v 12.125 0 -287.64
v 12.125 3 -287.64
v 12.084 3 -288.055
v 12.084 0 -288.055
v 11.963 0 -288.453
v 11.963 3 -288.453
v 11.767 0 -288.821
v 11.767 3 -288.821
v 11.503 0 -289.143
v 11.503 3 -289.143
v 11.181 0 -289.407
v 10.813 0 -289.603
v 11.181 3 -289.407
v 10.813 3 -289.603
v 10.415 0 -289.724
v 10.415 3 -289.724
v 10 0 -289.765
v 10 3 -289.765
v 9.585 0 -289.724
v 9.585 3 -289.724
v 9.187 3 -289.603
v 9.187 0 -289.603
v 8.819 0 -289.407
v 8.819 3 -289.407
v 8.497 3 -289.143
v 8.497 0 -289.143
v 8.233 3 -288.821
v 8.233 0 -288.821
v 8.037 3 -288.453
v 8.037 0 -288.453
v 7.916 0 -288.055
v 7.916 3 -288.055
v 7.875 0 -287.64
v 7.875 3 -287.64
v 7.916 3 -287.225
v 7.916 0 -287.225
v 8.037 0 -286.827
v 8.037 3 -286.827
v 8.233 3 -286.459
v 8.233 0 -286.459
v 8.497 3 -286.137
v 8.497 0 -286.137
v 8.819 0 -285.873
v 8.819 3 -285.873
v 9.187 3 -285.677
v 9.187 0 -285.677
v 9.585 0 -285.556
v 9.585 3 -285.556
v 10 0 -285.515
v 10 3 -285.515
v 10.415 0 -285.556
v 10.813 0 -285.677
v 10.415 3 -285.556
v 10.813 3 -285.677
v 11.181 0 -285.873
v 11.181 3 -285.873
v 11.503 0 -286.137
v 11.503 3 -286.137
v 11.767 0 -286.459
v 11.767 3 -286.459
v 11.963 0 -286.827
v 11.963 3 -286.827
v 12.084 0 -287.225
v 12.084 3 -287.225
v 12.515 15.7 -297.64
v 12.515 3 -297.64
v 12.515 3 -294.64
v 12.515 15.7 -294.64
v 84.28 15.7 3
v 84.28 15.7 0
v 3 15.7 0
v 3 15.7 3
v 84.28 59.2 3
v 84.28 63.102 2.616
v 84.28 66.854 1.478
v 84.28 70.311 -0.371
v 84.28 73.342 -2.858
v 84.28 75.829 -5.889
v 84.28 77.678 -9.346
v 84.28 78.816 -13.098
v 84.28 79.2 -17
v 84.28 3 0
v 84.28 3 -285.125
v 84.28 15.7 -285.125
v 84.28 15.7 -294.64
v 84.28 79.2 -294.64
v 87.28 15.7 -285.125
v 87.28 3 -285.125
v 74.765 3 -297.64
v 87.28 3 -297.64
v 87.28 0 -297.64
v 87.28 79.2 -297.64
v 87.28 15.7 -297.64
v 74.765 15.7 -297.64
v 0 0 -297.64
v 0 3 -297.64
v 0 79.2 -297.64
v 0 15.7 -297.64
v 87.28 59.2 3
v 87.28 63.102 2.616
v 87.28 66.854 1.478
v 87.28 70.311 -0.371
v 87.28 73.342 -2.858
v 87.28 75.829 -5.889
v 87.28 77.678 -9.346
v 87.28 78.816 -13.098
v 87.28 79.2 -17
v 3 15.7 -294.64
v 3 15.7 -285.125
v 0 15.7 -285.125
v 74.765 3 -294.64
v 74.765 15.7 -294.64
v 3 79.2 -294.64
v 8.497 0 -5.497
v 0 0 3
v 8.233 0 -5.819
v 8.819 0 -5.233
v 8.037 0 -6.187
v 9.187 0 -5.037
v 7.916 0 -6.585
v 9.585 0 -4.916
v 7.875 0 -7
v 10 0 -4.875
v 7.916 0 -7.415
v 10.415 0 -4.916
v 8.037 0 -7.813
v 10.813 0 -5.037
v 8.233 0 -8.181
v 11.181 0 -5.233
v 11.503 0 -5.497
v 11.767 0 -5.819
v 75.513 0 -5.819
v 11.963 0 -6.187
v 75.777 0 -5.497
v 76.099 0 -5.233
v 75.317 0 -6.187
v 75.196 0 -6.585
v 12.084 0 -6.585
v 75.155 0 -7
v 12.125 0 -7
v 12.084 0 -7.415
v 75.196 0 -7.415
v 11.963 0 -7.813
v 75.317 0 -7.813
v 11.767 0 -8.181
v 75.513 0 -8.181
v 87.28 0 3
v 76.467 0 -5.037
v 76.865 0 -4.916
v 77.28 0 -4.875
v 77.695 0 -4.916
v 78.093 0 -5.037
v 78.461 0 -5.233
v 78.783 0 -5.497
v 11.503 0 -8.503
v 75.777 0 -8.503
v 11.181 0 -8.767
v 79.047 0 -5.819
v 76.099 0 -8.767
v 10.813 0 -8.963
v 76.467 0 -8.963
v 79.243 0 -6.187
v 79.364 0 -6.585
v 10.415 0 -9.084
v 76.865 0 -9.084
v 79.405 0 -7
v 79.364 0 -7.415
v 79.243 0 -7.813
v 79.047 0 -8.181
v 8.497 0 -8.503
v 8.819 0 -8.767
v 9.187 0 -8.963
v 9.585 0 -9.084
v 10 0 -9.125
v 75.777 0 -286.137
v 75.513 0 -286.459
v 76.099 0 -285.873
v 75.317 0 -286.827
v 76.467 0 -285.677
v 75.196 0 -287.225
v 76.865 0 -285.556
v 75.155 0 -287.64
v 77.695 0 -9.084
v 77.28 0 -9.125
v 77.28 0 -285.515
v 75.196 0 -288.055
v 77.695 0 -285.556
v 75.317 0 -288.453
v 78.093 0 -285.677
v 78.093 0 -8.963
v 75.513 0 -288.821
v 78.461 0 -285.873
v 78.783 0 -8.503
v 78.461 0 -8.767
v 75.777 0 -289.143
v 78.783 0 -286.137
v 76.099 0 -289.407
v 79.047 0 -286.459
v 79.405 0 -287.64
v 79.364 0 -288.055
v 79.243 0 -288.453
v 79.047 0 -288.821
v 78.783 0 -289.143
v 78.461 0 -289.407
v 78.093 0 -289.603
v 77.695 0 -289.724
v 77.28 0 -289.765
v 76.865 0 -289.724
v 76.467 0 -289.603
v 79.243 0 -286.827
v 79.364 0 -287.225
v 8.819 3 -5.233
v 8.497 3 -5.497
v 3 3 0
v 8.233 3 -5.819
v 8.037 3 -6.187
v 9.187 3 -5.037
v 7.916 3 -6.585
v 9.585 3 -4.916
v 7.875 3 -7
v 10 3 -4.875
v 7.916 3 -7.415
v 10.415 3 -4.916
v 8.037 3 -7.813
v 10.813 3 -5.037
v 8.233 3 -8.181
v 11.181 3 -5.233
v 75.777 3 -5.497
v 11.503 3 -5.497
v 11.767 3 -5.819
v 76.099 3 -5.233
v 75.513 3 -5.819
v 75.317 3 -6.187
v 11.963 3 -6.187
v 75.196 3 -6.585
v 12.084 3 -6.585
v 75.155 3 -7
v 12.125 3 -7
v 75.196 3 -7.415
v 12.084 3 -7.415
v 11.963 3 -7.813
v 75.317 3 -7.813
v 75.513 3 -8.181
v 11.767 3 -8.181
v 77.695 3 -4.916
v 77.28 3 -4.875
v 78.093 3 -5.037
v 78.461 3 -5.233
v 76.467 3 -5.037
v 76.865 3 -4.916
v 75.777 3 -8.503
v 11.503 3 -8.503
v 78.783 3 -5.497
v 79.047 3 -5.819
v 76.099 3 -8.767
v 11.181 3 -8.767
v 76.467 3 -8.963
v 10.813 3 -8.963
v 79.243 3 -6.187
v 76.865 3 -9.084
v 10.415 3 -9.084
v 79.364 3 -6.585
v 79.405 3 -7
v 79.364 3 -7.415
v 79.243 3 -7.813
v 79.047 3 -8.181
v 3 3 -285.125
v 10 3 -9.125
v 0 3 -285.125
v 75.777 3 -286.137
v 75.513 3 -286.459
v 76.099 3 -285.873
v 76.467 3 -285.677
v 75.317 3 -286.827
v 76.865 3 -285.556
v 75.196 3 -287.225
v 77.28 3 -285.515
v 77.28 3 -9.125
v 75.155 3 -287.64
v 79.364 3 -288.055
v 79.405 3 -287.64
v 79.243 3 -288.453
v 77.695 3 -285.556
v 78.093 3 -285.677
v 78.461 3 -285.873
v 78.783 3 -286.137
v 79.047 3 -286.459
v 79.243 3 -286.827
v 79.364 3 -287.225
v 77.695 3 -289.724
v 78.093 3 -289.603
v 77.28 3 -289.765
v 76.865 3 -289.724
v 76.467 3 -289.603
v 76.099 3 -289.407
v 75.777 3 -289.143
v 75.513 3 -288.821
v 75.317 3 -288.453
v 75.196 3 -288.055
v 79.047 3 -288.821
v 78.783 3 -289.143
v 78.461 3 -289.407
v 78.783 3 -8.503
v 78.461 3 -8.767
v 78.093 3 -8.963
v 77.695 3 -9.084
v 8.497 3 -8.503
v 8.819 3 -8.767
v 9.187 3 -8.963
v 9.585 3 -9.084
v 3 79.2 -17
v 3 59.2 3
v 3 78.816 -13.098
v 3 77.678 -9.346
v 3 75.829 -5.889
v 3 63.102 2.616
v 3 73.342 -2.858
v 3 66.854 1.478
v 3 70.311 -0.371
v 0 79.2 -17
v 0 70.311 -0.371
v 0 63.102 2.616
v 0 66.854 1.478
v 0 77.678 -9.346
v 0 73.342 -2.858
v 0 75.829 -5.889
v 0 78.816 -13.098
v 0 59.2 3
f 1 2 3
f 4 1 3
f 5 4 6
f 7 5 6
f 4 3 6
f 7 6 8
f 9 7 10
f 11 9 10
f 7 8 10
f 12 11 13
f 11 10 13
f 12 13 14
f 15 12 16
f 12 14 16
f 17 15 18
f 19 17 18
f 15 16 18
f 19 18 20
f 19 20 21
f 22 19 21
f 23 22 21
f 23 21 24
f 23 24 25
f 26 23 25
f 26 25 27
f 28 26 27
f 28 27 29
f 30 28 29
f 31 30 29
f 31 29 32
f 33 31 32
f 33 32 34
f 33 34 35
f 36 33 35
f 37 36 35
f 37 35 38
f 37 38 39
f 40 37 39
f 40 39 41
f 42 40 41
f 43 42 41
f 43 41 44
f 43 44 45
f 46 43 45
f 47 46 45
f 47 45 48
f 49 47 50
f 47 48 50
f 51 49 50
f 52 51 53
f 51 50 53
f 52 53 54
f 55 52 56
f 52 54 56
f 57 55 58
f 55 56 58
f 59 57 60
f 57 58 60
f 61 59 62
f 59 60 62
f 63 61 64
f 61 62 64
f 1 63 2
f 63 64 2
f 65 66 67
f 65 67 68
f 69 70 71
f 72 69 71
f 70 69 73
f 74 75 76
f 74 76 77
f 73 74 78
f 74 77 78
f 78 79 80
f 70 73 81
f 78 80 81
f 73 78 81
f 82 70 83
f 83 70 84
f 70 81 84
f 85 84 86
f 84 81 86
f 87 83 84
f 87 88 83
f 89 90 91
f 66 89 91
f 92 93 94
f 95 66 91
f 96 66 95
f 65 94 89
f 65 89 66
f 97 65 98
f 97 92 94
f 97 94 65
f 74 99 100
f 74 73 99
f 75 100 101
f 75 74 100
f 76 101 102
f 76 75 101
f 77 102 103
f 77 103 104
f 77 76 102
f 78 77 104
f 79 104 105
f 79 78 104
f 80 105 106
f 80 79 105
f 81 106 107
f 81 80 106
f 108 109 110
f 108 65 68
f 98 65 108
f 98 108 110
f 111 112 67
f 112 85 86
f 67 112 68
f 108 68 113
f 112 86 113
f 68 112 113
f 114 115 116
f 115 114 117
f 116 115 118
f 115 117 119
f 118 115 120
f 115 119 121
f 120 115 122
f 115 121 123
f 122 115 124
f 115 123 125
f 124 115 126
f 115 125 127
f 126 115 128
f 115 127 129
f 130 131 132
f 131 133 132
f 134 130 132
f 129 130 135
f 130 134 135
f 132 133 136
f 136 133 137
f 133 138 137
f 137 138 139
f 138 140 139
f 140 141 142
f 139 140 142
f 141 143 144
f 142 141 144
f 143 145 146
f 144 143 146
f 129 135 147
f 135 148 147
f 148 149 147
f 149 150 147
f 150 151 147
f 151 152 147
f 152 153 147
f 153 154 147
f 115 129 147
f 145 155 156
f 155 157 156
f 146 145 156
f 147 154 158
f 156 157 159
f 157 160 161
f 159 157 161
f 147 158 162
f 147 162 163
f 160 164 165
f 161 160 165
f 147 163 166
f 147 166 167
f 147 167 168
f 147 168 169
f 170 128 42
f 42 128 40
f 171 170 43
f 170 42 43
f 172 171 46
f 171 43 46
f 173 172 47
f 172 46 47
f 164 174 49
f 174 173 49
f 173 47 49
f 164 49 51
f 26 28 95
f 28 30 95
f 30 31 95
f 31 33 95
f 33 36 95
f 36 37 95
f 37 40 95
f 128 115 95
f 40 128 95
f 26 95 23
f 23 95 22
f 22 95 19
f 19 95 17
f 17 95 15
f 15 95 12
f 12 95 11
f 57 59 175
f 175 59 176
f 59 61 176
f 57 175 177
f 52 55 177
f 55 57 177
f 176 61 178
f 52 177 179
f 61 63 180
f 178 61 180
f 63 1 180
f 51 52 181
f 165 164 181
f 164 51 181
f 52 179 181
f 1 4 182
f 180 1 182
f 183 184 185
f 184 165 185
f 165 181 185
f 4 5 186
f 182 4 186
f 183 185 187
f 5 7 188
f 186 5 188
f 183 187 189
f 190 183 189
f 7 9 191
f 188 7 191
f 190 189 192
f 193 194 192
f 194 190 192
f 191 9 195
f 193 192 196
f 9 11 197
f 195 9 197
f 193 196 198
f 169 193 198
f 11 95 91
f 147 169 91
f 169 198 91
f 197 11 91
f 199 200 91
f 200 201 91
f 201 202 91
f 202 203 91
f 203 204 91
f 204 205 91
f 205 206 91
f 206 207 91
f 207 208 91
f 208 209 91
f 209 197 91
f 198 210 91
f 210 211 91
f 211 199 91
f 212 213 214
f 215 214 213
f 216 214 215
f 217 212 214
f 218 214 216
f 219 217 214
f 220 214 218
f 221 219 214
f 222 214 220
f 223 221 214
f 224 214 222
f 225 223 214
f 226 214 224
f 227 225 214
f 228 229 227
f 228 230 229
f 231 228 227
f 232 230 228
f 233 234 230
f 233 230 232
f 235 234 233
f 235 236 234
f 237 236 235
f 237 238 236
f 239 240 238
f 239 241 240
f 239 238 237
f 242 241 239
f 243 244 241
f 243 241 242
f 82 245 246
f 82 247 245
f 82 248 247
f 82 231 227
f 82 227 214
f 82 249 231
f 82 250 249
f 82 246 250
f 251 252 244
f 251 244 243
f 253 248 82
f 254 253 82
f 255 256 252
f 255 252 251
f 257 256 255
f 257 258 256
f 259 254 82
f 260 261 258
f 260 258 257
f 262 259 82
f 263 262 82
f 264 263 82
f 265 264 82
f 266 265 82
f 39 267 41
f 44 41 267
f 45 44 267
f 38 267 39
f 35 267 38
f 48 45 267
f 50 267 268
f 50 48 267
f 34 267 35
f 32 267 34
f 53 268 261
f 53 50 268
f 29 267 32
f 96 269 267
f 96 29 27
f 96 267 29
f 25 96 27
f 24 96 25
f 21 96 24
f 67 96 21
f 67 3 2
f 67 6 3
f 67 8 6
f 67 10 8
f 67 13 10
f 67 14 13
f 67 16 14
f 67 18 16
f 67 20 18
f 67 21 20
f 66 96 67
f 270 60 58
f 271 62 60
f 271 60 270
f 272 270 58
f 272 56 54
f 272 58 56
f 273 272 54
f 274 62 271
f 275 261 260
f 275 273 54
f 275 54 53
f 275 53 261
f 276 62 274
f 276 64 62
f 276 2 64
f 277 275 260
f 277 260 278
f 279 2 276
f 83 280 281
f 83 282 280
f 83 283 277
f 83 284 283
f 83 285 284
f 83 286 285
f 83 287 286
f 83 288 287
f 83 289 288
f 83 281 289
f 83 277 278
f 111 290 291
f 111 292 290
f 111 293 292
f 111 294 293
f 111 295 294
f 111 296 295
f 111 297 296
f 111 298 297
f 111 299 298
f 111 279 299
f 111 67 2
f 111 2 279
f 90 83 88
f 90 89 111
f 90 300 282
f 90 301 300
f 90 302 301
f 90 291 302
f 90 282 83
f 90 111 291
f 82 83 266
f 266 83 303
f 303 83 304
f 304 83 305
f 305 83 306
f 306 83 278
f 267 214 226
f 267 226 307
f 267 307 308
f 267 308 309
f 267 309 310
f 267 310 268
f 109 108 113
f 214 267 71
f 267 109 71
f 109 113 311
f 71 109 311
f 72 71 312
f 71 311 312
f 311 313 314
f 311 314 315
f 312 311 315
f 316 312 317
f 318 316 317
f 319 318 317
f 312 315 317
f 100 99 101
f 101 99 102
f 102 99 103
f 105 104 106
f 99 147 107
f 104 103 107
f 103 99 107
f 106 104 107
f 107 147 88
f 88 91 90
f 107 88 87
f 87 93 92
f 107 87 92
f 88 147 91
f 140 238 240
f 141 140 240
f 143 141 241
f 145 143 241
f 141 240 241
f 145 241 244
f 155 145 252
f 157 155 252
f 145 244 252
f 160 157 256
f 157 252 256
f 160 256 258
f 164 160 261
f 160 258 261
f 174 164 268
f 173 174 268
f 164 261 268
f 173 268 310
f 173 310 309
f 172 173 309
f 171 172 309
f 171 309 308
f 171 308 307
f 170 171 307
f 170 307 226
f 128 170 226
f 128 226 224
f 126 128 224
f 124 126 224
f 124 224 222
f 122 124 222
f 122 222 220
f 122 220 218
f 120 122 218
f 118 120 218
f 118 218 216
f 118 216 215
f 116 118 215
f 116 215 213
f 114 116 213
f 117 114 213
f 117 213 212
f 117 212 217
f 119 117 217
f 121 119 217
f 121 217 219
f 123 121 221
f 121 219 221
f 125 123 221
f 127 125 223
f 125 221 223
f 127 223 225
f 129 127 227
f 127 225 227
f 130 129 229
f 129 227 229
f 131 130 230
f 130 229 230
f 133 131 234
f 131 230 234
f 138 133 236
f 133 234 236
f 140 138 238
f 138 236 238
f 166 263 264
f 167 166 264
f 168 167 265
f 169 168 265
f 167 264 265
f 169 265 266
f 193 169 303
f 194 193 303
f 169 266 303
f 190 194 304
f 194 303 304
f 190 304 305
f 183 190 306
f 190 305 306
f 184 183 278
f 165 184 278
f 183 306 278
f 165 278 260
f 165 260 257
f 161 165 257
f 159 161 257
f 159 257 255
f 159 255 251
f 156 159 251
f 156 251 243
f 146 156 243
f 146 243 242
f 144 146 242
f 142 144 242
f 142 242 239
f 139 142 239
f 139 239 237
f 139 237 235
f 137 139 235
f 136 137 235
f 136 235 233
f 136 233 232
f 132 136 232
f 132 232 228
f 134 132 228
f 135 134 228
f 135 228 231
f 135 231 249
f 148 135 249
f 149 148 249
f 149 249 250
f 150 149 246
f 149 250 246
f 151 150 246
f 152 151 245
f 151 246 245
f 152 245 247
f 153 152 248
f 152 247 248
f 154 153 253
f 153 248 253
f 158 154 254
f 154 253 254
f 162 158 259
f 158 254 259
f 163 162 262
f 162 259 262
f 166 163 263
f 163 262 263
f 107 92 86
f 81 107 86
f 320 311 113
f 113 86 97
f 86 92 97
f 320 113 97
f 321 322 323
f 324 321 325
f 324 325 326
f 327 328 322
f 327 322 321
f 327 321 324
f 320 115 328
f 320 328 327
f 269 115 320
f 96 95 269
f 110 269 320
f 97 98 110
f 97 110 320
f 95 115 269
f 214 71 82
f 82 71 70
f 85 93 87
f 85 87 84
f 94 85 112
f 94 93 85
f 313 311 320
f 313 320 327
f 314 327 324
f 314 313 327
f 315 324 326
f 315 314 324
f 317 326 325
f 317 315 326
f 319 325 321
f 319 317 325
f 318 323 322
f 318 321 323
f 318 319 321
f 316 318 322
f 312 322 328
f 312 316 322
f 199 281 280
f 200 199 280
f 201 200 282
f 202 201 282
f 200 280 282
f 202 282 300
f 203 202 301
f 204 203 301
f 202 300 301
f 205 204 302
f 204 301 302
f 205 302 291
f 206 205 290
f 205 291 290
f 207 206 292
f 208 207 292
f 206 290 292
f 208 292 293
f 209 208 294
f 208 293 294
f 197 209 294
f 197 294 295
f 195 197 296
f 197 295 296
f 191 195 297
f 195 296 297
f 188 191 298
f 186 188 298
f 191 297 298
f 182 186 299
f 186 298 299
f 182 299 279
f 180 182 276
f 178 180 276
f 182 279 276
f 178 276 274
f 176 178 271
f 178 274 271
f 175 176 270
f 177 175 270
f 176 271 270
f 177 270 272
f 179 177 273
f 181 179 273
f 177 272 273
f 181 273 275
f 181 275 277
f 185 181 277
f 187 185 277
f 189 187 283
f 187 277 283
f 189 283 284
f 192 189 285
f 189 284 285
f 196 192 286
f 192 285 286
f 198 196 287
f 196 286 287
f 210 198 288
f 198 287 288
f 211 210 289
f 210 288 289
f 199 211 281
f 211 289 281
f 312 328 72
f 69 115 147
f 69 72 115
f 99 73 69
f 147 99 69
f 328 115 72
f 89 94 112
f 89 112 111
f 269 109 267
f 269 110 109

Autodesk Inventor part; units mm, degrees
ref_plane "YZ Plane" through (0, 0, 0) normal (1, 0, 0) x (0, 1, 0)
ref_plane "XZ Plane" through (0, 0, 0) normal (0, 1, 0) x (-1, 0, 0)
ref_plane "XY Plane" through (0, 0, 0) normal (0, 0, 1) x (1, 0, 0)
sketch "Sketch1" plane through (0, 0, 0) normal (0, 0, 1) x (1, 0, 0)
  line L0 (0, 0) -> (87.28, 0)
  line L1 (0, 0) -> (0, 15.7)
  line L2 (87.28, 0) -> (87.28, 15.7)
  line L3 (87.28, 15.7) -> (0, 15.7)
  dimension "d0" = 87.28
  dimension "d1" = 15.7
  dimension "d2" = 15.7
extrude "Extrusion1" add sketch "Sketch1" along normal blind 3
sketch "Sketch2" plane through (0, 0, 0) normal (0, -1, 0) x (1, 0, 0)
  line L0 (87.28, 0) -> (0, 0)
  line L1 (0, 0) -> (0, -297.64)
  line L2 (0, -297.64) -> (87.28, -297.64)
  line L3 (87.28, -297.64) -> (87.28, 0)
  dimension "d5" = 297.64
extrude "Extrusion2" add sketch "Sketch2" against normal blind 3
sketch "Sketch3" plane through (87.28, 0, 3) normal (1, 0, 0) x (0, 0, -1)
  line L0 (0, 15.7) -> (0, 79.2)
  line L1 (0, 79.2) -> (3, 79.2)
  line L2 (3, 15.7) -> (0, 15.7) projected
  line L3 (3, 79.2) -> (3, 15.7)
  line L4 (3, 3) -> (3, 15.7) projected
  line L5 (3, 15.7) -> (3, 3)
  line L6 (3, 3) -> (300.64, 3)
  line L7 (300.64, 3) -> (300.64, 79.2)
  line L8 (300.64, 79.2) -> (3, 79.2)
  point P0 (3, 0)
  dimension "d8" = 63.5
extrude "Extrusion3" add sketch "Sketch3" against normal blind 3
fillet "Fillet1" radius 20 1 edges at (85.78, 79.2, 3)
sketch "Sketch4" plane through (0, 0, 3) normal (-1, 0, 0) x (0, 0, 1)
  line L0 (0, 0) -> (0, 59.2) projected
  line L1 (0, 15.7) -> (0, 79.2)
  line L2 (0, 79.2) -> (-3, 79.2)
  line L3 (0, 15.7) -> (-3, 15.7) projected
  line L4 (-3, 79.2) -> (-3, 15.7)
  line L5 (-3, 15.7) -> (-3, 3) projected
  line L6 (-3, 15.7) -> (-3, 3)
  line L7 (-3, 3) -> (-300.64, 3)
  line L8 (-300.64, 0) -> (-300.64, 79.2) projected
  line L9 (-300.64, 79.2) -> (-300.64, 3)
  line L10 (-300.64, 79.2) -> (-3, 79.2)
  point P0 (-3, 0)
  dimension "d12" = 63.5
  dimension "d13" = 3
extrude "Extrusion4" add sketch "Sketch4" against normal blind 3
fillet "Fillet2" radius 20 1 edges at (1.5, 79.2, 3)
sketch "Sketch5" plane through (87.28, 0, -297.64) normal (0, 0, -1) x (-1, 0, 0)
  line L0 (0, 79.2) -> (3, 79.2) projected
  line L1 (3, 3) -> (84.28, 3) projected
  line L2 (3, 79.2) -> (84.28, 79.2)
  line L3 (84.28, 79.2) -> (84.28, 3)
  line L4 (84.28, 3) -> (3, 3)
  line L5 (3, 3) -> (3, 79.2)
  point P0 (87.28, 0)
extrude "Extrusion5" add sketch "Sketch5" against normal blind 3
sketch "Sketch6" plane through (87.28, 0, 3) normal (1, 0, 0) x (0, 0, -1)
  line L0 (300.64, 0) -> (300.64, 79.2) projected
  line L1 (300.64, 3) -> (288.125, 3)
  line L2 (300.64, 0) -> (0, 0) projected
  line L3 (300.64, 3) -> (300.64, 15.7)
  line L4 (288.125, 3) -> (288.125, 15.7)
  line L5 (288.125, 15.7) -> (300.64, 15.7)
  point P0 (3, 0)
  dimension "d19" = 3
  dimension "d20" = 12.515
  dimension "d21" = 12.7
extrude "Extrusion6" cut sketch "Sketch6" against normal blind 3
sketch "Sketch7" plane through (87.28, 0, -297.64) normal (0, 0, -1) x (-1, 0, 0)
  line L0 (0, 15.7) -> (3, 15.7) projected
  line L1 (3, 15.7) -> (12.515, 15.7)
  line L2 (3, 15.7) -> (84.28, 15.7) projected
  line L3 (12.515, 15.7) -> (12.515, 3)
  line L4 (3, 3) -> (84.28, 3) projected
  line L5 (0, 3) -> (3, 3) projected
  line L6 (3, 3) -> (12.515, 3)
  line L7 (3, 15.7) -> (3, 3) projected
  line L8 (3, 15.7) -> (3, 3)
  point P0 (87.28, 0)
  dimension "d24" = 9.515
extrude "Extrusion7" cut sketch "Sketch7" against normal blind 3
sketch "Sketch8" plane through (87.28, 0, -297.64) normal (0, 0, -1) x (-1, 0, 0)
  line L0 (87.28, 0) -> (87.28, 79.2) projected
  line L1 (87.28, 3) -> (74.765, 3)
  line L2 (87.28, 0) -> (0, 0) projected
  line L3 (74.765, 3) -> (74.765, 15.7)
  line L4 (74.765, 15.7) -> (87.28, 15.7)
  line L5 (87.28, 15.7) -> (87.28, 3)
  dimension "d27" = 3
  dimension "d28" = 12.515
  dimension "d29" = 12.7
extrude "Extrusion8" cut sketch "Sketch8" against normal blind 3
sketch "Sketch9" plane through (0, 0, -297.64) normal (-1, 0, 0) x (0, 0, 1)
  line L0 (0, 15.7) -> (3, 15.7) projected
  line L1 (3, 3) -> (3, 15.7) projected
  line L2 (3, 15.7) -> (3, 3)
  line L3 (12.515, 15.7) -> (0, 15.7) projected
  line L4 (3, 15.7) -> (12.515, 15.7)
  line L5 (12.515, 15.7) -> (12.515, 3) projected
  line L6 (12.515, 15.7) -> (12.515, 3)
  line L7 (12.515, 3) -> (3, 3)
  point P0 (297.64, 0)
extrude "Extrusion9" cut sketch "Sketch9" against normal blind 3
sketch "Sketch10" plane through (0, 3, 0) normal (0, 1, 0) x (1, 0, 0)
  circle A0 centre (10, 7) radius 2.125
  circle A1 centre (77.28, 7) radius 2.125
  circle A2 centre (10, 287.64) radius 2.125
  circle A3 centre (77.28, 287.64) radius 2.125
  line L0 (0, 297.64) -> (12.515, 297.64) projected
  line L1 (0, 285.125) -> (0, 297.64) projected
  line L2 (87.28, 297.64) -> (87.28, 285.125) projected
  line L3 (74.765, 297.64) -> (87.28, 297.64) projected
  line L4 (0, -3) -> (87.28, -3) projected
  line L5 (0, 297.64) -> (0, -3) projected
  line L6 (87.28, 297.64) -> (87.28, -3) projected
  point P0 (0, 0)
  dimension "d34" = 4.25
  dimension "d35" = 4.25
  dimension "d36" = 4.25
  dimension "d37" = 4.25
  dimension "d38" = 10
  dimension "d39" = 10
  dimension "d40" = 10
  dimension "d41" = 10
  dimension "d42" = 10
  dimension "d43" = 10
  dimension "d44" = 10
  dimension "d45" = 10
extrude "Extrusion10" cut sketch "Sketch10" against normal blind 3
properties part number "Hopper"
